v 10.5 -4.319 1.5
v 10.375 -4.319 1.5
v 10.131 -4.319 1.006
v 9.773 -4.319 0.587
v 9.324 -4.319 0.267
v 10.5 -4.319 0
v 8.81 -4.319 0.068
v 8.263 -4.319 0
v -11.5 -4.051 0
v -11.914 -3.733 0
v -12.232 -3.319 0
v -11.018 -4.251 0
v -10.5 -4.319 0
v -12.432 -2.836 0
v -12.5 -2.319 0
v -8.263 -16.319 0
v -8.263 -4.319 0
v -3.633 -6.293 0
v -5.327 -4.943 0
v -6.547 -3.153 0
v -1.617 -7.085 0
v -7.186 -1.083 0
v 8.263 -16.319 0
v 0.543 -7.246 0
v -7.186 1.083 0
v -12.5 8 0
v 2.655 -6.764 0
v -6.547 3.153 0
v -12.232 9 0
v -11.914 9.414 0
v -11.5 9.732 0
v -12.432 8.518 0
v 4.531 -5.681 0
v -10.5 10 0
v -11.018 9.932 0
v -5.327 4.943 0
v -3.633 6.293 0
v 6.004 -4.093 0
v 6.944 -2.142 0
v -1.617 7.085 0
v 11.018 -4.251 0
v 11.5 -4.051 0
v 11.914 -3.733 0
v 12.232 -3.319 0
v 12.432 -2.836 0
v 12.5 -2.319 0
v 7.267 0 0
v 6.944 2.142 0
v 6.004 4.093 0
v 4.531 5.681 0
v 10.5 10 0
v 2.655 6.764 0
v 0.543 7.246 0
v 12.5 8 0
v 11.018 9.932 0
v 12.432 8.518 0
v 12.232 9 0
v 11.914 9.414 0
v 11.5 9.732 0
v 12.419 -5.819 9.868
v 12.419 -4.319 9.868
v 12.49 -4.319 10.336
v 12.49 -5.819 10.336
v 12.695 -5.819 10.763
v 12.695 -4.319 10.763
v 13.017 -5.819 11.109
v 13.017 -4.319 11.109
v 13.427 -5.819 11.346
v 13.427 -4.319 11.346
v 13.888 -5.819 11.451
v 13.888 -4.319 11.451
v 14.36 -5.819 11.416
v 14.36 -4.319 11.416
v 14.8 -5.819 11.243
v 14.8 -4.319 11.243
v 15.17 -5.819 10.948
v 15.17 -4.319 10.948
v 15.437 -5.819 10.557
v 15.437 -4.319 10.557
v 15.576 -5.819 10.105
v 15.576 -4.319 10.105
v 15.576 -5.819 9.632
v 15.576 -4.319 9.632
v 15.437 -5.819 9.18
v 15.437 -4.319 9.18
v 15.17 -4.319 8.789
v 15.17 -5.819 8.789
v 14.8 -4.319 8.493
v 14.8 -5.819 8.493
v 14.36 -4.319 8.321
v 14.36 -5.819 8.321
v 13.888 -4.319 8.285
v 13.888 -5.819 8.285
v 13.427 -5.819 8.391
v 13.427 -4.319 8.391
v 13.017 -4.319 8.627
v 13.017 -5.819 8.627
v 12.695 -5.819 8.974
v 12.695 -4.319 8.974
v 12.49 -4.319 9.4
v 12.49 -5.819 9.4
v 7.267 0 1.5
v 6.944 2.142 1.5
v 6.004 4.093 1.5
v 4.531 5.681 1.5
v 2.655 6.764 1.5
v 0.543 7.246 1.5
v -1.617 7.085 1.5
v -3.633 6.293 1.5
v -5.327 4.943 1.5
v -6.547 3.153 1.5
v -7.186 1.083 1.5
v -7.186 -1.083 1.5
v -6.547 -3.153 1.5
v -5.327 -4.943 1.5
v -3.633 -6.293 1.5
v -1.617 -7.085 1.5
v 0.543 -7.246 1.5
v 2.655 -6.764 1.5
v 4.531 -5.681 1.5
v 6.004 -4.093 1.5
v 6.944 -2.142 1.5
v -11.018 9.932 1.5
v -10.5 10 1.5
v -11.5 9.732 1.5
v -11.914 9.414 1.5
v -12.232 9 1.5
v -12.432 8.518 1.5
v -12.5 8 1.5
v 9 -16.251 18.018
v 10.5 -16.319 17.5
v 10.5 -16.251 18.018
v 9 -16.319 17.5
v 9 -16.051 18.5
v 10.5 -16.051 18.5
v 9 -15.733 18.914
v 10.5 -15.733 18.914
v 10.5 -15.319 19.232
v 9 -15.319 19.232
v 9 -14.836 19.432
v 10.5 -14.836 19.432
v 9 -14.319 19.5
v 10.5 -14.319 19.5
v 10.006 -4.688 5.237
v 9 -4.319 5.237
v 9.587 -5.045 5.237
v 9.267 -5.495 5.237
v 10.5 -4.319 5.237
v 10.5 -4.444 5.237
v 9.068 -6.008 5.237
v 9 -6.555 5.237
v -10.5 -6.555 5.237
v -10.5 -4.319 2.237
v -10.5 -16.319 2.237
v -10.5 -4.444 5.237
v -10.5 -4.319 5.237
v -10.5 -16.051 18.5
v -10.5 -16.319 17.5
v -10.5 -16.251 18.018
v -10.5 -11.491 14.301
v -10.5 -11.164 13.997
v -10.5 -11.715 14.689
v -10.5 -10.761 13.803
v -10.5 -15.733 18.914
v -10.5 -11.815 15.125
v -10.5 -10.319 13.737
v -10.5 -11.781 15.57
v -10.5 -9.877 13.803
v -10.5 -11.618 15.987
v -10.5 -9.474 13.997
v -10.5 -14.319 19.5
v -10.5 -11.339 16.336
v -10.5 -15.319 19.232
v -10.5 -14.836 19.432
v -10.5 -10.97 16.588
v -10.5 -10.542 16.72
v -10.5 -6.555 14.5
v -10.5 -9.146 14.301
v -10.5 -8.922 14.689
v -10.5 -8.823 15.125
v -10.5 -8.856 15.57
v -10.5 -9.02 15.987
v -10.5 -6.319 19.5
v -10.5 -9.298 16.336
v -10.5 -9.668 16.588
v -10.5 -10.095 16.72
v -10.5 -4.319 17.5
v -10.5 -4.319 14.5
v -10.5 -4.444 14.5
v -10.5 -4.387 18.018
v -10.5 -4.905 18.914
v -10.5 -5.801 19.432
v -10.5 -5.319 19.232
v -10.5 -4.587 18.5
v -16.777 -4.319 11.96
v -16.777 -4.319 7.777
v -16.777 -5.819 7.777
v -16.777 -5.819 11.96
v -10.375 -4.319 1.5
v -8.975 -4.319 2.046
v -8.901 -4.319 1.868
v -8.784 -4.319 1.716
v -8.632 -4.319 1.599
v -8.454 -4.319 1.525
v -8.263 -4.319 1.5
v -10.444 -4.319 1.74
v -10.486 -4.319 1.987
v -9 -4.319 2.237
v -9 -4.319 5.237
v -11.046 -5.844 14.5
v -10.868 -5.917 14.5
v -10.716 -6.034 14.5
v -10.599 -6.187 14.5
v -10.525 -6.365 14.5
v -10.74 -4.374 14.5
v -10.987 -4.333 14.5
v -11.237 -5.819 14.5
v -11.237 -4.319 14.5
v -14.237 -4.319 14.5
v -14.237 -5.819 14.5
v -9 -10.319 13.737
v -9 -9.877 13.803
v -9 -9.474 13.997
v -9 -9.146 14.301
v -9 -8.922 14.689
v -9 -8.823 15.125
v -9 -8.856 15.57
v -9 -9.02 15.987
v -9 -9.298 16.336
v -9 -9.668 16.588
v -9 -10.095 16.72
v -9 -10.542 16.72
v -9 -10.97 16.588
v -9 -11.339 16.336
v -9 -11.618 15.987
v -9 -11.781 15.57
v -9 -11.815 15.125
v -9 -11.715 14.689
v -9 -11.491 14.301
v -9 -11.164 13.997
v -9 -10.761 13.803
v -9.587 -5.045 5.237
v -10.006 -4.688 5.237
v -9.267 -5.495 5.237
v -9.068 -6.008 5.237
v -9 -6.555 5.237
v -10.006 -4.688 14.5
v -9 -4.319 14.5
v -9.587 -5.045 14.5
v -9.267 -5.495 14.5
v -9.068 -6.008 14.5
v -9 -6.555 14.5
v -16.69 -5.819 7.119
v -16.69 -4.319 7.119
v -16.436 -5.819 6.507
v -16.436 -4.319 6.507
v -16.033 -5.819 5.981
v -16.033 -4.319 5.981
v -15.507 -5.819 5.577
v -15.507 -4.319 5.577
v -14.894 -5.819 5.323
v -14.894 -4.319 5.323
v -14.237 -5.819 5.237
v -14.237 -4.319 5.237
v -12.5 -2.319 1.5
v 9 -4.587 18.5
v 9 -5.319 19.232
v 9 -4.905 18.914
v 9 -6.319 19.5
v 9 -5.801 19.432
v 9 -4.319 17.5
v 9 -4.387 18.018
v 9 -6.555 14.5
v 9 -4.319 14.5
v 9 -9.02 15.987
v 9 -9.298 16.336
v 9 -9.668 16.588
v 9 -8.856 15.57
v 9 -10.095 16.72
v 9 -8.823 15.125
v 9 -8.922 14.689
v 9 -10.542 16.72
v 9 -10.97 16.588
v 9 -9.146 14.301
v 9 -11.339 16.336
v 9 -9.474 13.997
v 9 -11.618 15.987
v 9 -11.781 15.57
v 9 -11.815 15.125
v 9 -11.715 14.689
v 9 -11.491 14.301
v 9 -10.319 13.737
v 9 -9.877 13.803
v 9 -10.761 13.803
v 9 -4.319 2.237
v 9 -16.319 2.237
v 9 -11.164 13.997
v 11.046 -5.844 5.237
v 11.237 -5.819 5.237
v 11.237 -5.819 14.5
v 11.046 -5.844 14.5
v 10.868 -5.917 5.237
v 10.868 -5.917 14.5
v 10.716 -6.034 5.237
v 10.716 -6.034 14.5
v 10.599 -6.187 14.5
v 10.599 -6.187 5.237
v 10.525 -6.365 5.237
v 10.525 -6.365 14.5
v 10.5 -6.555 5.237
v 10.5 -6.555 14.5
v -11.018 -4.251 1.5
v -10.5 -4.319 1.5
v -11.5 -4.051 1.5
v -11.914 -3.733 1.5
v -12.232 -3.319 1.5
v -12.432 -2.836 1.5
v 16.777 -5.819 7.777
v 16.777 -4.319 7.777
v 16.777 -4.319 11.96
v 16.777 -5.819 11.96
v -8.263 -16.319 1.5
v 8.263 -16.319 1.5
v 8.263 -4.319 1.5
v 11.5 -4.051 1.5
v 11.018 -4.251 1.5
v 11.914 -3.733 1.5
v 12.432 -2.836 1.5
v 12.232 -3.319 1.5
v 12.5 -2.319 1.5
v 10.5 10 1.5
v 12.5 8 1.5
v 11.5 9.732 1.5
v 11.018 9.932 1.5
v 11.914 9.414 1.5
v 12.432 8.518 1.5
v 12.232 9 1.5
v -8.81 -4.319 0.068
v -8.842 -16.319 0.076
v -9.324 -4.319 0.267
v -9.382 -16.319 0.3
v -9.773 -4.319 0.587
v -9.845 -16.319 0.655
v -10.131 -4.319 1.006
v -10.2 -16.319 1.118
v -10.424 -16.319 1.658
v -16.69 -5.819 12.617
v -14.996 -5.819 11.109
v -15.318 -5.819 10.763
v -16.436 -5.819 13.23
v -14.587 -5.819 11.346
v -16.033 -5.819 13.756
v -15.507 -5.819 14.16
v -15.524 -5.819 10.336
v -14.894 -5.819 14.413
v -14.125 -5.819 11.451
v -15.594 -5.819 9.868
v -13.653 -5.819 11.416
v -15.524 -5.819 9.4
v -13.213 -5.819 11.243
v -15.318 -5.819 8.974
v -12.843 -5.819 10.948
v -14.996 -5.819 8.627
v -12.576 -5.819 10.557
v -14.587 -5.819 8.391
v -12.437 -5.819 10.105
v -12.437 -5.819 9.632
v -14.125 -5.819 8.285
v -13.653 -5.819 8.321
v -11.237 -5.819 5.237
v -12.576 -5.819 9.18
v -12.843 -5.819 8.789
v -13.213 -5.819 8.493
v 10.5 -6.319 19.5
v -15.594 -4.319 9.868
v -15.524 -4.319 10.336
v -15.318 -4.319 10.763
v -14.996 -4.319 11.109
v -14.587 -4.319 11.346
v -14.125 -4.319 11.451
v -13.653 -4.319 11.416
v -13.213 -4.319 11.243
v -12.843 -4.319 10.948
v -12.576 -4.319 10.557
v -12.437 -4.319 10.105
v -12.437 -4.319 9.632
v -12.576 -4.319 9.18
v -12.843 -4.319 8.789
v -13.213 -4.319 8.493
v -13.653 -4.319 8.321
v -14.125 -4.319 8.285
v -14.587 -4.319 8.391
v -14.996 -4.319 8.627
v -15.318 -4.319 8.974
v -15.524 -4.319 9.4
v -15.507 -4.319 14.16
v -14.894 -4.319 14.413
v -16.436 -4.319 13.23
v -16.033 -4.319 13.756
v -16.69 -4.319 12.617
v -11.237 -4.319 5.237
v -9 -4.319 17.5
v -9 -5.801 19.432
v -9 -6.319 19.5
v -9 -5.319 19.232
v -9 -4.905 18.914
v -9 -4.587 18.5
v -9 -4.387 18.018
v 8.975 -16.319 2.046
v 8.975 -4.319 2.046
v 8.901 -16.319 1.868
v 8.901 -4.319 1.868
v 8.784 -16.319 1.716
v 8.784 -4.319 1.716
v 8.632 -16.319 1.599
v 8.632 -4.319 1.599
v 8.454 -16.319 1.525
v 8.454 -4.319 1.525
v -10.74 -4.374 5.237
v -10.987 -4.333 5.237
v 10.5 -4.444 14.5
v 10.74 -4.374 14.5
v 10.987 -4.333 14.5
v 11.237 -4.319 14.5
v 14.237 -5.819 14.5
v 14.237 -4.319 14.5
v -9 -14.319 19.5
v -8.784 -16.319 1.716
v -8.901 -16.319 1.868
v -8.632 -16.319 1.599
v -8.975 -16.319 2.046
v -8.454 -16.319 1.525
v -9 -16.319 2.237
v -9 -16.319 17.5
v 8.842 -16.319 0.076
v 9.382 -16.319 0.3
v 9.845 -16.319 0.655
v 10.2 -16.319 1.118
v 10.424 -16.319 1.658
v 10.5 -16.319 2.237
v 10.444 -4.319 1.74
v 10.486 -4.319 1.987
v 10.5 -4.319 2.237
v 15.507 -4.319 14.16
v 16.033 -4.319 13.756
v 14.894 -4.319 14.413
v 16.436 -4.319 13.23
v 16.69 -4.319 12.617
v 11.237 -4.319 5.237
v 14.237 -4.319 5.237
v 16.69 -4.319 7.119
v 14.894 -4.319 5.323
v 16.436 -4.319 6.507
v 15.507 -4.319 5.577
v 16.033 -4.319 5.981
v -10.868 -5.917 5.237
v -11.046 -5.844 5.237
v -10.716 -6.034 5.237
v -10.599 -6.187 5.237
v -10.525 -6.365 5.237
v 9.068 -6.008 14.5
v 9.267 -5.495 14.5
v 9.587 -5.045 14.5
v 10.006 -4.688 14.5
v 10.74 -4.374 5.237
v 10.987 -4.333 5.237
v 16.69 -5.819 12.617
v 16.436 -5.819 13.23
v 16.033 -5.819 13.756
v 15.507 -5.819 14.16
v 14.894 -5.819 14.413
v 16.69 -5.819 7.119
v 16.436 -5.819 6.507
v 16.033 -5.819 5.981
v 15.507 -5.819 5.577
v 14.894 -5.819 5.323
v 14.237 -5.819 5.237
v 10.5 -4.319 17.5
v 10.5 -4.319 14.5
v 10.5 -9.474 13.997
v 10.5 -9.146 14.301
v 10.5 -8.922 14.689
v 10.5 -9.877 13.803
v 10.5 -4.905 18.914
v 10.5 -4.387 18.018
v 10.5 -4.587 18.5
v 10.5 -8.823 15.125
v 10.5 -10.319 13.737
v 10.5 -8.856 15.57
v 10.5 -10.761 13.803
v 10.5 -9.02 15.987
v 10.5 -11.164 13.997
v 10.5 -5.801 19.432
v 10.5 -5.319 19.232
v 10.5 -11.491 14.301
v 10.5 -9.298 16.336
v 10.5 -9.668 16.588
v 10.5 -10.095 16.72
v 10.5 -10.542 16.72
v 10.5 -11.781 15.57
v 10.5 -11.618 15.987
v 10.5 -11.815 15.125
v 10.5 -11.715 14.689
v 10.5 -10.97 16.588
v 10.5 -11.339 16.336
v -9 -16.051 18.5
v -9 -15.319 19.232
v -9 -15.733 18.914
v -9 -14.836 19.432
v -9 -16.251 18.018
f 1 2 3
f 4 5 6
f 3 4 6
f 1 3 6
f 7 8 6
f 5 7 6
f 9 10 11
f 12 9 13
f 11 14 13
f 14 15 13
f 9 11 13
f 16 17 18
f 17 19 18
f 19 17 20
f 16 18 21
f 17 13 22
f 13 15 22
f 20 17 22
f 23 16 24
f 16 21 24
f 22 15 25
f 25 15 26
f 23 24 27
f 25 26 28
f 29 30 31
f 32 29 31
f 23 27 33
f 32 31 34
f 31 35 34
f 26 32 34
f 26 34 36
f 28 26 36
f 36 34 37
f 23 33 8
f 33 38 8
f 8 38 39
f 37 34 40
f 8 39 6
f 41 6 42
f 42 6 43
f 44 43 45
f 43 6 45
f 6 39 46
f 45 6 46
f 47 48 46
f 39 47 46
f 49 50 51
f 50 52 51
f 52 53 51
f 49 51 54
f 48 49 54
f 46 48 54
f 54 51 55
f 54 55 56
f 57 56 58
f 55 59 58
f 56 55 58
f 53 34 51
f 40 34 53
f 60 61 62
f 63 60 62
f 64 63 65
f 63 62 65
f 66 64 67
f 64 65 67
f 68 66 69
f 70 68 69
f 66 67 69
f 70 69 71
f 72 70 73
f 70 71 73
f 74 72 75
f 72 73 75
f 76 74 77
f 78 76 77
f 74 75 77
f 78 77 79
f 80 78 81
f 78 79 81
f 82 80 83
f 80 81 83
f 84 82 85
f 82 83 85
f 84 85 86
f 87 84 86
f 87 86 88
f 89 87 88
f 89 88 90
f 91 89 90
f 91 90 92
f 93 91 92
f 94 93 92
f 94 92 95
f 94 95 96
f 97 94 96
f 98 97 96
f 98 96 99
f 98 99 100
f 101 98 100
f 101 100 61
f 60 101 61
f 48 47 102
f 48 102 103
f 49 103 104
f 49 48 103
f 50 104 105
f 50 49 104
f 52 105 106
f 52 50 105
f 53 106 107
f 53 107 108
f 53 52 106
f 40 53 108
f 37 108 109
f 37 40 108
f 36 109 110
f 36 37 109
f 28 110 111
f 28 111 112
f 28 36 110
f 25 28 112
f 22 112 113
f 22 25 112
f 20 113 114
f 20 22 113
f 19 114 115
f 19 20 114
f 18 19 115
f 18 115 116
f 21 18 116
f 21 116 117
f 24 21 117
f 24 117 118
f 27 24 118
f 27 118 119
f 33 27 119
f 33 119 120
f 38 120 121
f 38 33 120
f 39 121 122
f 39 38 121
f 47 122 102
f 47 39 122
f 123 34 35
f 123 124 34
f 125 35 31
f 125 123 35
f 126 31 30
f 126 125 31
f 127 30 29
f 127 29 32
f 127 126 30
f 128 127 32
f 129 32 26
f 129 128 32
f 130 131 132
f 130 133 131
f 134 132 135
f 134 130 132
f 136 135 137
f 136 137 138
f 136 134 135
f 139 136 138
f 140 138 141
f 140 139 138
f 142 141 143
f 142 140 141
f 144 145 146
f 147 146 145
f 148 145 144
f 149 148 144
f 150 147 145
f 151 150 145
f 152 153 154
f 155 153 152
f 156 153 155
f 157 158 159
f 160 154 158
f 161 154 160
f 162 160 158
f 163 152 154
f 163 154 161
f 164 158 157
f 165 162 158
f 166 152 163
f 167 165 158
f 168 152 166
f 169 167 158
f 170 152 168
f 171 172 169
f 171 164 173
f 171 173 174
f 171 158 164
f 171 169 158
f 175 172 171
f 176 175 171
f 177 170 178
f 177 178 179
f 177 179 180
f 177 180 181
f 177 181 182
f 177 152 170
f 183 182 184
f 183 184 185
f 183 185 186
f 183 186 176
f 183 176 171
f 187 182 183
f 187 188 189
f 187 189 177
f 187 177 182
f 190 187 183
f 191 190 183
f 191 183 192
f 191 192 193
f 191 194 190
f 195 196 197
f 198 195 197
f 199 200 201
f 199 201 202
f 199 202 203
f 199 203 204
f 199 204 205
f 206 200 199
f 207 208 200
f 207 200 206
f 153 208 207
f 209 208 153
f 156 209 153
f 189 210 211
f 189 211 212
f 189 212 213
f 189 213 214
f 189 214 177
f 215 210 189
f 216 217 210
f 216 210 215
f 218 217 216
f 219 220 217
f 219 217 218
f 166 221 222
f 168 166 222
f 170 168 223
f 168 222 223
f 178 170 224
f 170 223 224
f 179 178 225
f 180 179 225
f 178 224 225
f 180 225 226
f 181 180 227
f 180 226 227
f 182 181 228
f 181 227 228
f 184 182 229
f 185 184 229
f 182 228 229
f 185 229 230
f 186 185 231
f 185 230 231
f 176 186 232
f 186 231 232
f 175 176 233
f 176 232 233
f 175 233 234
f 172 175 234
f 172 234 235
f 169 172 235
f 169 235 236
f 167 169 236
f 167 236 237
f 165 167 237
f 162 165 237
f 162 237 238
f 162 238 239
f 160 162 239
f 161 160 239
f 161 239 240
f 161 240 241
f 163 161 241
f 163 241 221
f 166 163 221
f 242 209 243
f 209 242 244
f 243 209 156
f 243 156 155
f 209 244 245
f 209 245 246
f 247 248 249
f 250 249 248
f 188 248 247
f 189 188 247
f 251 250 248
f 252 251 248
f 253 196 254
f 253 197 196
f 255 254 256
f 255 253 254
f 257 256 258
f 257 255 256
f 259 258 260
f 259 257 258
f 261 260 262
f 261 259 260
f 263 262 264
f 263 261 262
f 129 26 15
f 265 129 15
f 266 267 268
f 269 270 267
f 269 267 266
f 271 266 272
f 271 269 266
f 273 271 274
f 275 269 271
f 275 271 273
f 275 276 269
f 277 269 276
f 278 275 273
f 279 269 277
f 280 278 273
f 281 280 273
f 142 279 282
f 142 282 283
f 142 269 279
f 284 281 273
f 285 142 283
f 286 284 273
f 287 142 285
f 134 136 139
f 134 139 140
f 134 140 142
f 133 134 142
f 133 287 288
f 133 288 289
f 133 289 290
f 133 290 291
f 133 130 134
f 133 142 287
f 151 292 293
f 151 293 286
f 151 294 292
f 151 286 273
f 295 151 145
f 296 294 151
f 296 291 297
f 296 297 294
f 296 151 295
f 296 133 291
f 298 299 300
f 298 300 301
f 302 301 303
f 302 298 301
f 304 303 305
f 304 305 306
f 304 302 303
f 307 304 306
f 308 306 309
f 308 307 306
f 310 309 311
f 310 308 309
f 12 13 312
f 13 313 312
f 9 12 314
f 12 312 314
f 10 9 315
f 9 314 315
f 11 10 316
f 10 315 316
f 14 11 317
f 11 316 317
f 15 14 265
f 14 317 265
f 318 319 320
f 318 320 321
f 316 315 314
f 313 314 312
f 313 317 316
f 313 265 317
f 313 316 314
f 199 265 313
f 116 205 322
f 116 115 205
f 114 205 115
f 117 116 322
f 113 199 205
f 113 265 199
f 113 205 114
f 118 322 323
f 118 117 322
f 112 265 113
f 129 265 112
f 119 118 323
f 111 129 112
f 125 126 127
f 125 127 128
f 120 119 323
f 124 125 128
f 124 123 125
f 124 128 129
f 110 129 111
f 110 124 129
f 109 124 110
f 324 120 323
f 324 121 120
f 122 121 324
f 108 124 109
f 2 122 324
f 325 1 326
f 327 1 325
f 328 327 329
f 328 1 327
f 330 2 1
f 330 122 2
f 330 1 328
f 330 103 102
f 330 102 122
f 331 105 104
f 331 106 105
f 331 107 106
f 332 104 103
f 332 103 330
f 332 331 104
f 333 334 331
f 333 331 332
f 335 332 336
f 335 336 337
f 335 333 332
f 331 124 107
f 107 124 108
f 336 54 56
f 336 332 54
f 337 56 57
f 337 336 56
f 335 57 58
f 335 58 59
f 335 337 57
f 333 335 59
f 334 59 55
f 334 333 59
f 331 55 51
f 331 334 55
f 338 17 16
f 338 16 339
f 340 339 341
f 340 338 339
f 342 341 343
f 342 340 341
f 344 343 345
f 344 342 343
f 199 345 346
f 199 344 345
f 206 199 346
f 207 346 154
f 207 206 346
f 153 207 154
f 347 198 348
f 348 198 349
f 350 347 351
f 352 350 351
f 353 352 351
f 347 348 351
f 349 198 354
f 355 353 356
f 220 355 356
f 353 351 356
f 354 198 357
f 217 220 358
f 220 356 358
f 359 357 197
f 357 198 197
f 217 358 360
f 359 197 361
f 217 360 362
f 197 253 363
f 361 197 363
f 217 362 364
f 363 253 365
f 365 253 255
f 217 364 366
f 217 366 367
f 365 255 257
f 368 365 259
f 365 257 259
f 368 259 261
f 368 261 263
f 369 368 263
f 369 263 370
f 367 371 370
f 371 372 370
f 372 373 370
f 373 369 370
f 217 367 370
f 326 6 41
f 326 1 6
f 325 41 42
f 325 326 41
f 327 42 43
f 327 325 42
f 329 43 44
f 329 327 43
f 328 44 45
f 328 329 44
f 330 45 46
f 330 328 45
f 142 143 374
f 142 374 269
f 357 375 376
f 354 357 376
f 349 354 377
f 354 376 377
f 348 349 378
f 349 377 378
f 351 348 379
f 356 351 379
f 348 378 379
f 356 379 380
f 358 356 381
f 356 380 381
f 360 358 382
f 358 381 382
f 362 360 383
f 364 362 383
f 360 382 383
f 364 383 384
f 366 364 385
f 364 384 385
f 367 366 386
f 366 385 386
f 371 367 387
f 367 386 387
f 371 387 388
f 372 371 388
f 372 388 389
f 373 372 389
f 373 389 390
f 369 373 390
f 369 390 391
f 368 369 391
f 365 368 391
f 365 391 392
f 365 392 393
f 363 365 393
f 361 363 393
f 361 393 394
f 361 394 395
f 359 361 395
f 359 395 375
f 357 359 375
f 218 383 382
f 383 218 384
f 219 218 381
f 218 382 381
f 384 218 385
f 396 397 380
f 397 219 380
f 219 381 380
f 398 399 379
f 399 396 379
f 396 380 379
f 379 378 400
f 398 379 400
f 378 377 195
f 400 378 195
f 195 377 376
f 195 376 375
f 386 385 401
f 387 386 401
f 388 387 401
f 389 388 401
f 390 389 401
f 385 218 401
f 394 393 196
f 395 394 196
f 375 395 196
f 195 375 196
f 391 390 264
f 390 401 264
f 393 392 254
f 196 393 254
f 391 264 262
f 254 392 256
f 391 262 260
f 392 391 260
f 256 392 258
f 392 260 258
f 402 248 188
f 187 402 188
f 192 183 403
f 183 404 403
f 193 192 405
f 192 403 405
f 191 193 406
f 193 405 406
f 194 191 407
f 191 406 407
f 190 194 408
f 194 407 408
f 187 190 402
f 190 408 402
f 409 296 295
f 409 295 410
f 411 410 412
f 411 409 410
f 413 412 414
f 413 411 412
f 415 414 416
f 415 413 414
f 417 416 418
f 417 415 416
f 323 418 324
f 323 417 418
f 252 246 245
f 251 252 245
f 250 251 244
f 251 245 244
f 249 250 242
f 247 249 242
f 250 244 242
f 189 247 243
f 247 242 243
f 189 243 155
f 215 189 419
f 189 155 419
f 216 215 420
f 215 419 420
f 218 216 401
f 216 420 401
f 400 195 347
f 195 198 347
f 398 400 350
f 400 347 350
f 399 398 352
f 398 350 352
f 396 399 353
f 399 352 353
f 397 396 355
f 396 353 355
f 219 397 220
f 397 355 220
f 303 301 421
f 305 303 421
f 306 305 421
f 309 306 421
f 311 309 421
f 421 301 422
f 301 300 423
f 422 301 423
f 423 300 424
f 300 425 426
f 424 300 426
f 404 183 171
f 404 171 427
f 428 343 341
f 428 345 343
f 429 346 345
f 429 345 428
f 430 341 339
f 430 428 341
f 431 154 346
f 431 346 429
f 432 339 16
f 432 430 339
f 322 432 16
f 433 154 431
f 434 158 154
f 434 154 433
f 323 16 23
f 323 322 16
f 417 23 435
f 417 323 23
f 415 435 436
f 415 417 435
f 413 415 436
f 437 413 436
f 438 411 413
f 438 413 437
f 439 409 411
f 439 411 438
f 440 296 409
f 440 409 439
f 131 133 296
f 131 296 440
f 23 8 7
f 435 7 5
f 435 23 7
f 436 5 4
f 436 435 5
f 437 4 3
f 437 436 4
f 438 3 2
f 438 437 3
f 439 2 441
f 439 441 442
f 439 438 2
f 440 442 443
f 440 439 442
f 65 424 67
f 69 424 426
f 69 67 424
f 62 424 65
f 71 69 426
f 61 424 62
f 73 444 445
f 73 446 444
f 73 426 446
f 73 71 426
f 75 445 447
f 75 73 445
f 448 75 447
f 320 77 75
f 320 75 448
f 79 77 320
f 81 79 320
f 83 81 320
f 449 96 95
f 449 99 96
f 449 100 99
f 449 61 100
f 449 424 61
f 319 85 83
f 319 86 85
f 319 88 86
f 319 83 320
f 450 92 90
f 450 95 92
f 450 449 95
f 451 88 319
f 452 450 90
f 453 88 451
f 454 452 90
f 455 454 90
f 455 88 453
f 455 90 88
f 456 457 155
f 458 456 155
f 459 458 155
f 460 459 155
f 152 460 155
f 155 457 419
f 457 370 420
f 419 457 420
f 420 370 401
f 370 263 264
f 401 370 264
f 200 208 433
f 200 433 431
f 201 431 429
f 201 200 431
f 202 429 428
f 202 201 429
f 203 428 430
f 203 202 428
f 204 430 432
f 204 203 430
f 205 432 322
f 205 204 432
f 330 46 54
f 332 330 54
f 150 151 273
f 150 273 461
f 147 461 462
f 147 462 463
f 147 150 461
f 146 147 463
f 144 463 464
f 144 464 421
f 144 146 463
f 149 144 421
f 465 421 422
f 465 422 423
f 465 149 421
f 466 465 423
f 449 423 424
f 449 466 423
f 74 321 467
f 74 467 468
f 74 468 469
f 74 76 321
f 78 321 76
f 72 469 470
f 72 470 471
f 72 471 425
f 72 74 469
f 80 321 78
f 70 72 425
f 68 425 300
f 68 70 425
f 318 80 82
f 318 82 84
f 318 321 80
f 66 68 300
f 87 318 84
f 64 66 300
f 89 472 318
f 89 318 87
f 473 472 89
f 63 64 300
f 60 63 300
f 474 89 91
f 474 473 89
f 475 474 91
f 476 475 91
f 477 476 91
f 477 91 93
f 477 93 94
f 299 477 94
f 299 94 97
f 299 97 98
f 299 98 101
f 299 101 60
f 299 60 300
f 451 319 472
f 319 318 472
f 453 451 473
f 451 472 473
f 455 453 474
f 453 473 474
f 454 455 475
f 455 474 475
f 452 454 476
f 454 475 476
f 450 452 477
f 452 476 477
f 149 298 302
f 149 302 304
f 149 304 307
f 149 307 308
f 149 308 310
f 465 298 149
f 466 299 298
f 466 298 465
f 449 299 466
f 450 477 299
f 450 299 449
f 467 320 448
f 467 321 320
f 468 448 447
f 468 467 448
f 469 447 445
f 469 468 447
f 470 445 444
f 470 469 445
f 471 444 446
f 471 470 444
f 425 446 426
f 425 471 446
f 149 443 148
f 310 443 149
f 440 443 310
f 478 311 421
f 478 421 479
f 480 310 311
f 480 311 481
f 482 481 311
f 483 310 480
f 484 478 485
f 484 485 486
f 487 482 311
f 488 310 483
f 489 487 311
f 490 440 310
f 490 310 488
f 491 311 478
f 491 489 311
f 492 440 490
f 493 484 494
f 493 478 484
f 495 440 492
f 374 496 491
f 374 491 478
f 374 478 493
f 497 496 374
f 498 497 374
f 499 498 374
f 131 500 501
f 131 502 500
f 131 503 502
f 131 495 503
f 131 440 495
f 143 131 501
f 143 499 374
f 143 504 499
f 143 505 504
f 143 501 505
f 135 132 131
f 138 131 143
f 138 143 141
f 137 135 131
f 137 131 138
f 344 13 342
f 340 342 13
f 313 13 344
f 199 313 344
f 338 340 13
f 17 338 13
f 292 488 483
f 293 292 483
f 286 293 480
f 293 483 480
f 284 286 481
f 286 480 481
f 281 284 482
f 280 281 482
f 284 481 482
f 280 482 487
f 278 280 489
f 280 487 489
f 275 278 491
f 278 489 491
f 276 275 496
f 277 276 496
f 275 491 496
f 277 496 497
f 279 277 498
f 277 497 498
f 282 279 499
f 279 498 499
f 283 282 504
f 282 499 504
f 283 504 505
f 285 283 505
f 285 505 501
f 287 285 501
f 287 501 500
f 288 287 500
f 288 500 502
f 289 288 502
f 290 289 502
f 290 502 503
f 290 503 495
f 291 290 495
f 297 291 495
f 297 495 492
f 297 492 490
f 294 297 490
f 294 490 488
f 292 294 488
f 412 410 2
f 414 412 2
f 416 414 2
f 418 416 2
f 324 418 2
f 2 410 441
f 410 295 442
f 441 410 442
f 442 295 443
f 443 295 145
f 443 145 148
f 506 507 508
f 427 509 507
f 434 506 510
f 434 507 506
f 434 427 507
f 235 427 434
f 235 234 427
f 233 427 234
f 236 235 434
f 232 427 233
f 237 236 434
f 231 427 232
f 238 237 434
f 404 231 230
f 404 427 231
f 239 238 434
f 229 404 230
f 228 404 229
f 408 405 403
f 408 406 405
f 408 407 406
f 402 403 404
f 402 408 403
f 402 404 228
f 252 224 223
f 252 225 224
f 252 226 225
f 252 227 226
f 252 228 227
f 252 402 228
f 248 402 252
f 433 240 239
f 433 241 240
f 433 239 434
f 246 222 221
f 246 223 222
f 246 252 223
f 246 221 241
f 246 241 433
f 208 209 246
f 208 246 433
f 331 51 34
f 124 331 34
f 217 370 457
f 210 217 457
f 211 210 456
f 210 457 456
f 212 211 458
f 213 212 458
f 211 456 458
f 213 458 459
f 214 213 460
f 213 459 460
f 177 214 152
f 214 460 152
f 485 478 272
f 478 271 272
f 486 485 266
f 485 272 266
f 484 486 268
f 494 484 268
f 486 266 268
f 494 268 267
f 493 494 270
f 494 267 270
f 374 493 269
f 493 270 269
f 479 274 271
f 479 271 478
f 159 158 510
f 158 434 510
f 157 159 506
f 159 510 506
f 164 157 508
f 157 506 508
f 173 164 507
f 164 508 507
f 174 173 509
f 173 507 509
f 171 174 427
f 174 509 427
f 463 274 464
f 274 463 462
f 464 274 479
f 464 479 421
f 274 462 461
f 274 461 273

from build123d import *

# Parameters (mm, degrees)
SKETCH1_R                      = 7.266716582
BASE_FLANGE1_DEPTH             = 1.5
EDGE_FLANGE1_STRIP_W           = 7.4732
EDGE_FLANGE1_STRIP_H           = 1.5
EDGE_FLANGE1_STRIP_CUT_DEPTH   = 12
EDGE_FLANGE1_STRIP_2_W         = 7.4732
EDGE_FLANGE1_STRIP_2_H         = 1.5
EDGE_FLANGE1_STRIP_CUT_2_DEPTH = 12
EDGE_FLANGE1_DEPTH             = 12
EDGE_FLANGE1_BEND_DEPTH        = 12
SKETCH9_R                      = 1.5
CUT_EXTRUDE1_DEPTH             = 35.286317994
FILLET1_R                      = 2
EDGE_FLANGE3_STRIP_W           = 7.4732
EDGE_FLANGE3_STRIP_H           = 1.5
EDGE_FLANGE3_STRIP_CUT_DEPTH   = 9.2634
EDGE_FLANGE3_DEPTH             = 9.2634
FILLET2_R                      = 2.54
FILLET2_OF_MIRROR1_R           = 2.54
SKETCH20_R                     = 1.5875
CUT_EXTRUDE3_DEPTH             = 2.54


# Sheet-metal steps are written as plain solids
with BuildPart() as part:
    # Sketch1 → Base-Flange1 (new body)
    with BuildSketch(Plane.XY):
        Polygon((-9, -16.31875), (9, -16.31875), (9, -4.31875), (12.5, -4.31875), (12.5, 10), (-12.5, 10), (-12.5, -4.31875), (-9, -4.31875), align=None)
        Circle(SKETCH1_R, mode=Mode.SUBTRACT)
    extrude(amount=BASE_FLANGE1_DEPTH)

    # Edge-Flange1 strip (across the edge) → Edge-Flange1 strip cut (cut)
    with BuildSketch(Plane(origin=(-9, -4.31875, 1.5), x_dir=(1, 0, 0), z_dir=(0, -1, 0))):
        with Locations((-3, -0.75)):
            Rectangle(EDGE_FLANGE1_STRIP_W, EDGE_FLANGE1_STRIP_H)
    extrude(amount=EDGE_FLANGE1_STRIP_CUT_DEPTH, mode=Mode.SUBTRACT)

    # Edge-Flange1 strip 2 (across the edge) → Edge-Flange1 strip cut 2 (cut)
    with BuildSketch(Plane(origin=(9, -16.31875, 1.5), x_dir=(-1, 0, 0), z_dir=(0, 1, 0))):
        with Locations((-3, -0.75)):
            Rectangle(EDGE_FLANGE1_STRIP_2_W, EDGE_FLANGE1_STRIP_2_H)
    extrude(amount=EDGE_FLANGE1_STRIP_CUT_2_DEPTH, mode=Mode.SUBTRACT)

    # Edge-Flange1 section (across the edge) → Edge-Flange1 (add)
    with BuildSketch(Plane(origin=(-9, -4.31875, 1.5), x_dir=(1, 0, 0), z_dir=(0, -1, 0))):
        with BuildLine():
            Line((-1.5, 0.7366), (-1.5, 18))
            Line((-1.5, 18), (0, 18))
            Line((0, 18), (0, 0.7366))
            ThreePointArc((0, 0.7366), (0.215745145, 0.215745145), (0.7366, 0))
            Line((0.7366, 0), (0.7366, -1.5))
            ThreePointArc((0.7366, -1.5), (-0.844915027, -0.844915027), (-1.5, 0.7366))
        make_face()
    extrude(amount=EDGE_FLANGE1_DEPTH)

    # Edge-Flange1 section 2 (across the edge) → Edge-Flange1 bend (add)
    with BuildSketch(Plane(origin=(9, -16.31875, 1.5), x_dir=(-1, 0, 0), z_dir=(0, 1, 0))):
        with BuildLine():
            Line((-1.5, 0.7366), (-1.5, 18))
            Line((-1.5, 18), (0, 18))
            Line((0, 18), (0, 0.7366))
            ThreePointArc((0, 0.7366), (0.215745145, 0.215745145), (0.7366, 0))
            Line((0.7366, 0), (0.7366, -1.5))
            ThreePointArc((0.7366, -1.5), (-0.844915027, -0.844915027), (-1.5, 0.7366))
        make_face()
    extrude(amount=EDGE_FLANGE1_BEND_DEPTH)

    # Sketch9 → Cut-Extrude1 (cut, through all)
    with BuildSketch(Plane(origin=(10.5, 0, 0), x_dir=(0, 0, -1), z_dir=(1, 0, 0))):
        with Locations((-15.2366, -10.31875)):
            Circle(SKETCH9_R)
    extrude(amount=-CUT_EXTRUDE1_DEPTH, mode=Mode.SUBTRACT)

    # Fillet1
    fillet1_edges = [part.edges().sort_by_distance(p)[0] for p in [
        (-12.5, -4.31875, 0.75),
        (-12.5, 10, 0.75),
        (12.5, 10, 0.75),
        (12.5, -4.31875, 0.75),
        (-9.75, -4.31875, 19.5),
        (-9.75, -16.31875, 19.5),
        (9.75, -16.31875, 19.5),
        (9.75, -4.31875, 19.5),
    ]]
    fillet(fillet1_edges, radius=FILLET1_R)

    # Edge-Flange3 strip (across the edge) → Edge-Flange3 strip cut (cut)
    with BuildSketch(Plane(origin=(10.5, -4.31875, 5.2366), x_dir=(0, -1, 0), z_dir=(0, 0, 1))):
        with Locations((-1.5, -0.75)):
            Rectangle(EDGE_FLANGE3_STRIP_W, EDGE_FLANGE3_STRIP_H)
    edge_flange3_strip_cut = extrude(amount=EDGE_FLANGE3_STRIP_CUT_DEPTH, mode=Mode.SUBTRACT)

    # Edge-Flange3 section (across the edge) → Edge-Flange3 (add)
    with BuildSketch(Plane(origin=(10.5, -4.31875, 5.2366), x_dir=(0, -1, 0), z_dir=(0, 0, 1))):
        with BuildLine():
            Line((0, 0.7366), (0, 6.2766))
            Line((0, 6.2766), (1.5, 6.2766))
            Line((1.5, 6.2766), (1.5, 0.7366))
            ThreePointArc((1.5, 0.7366), (1.715745145, 0.215745145), (2.2366, 0))
            Line((2.2366, 0), (2.2366, -1.5))
            ThreePointArc((2.2366, -1.5), (0.655084973, -0.844915027), (0, 0.7366))
        make_face()
    edge_flange3 = extrude(amount=EDGE_FLANGE3_DEPTH)

    # Fillet2
    fillet2_edges = [part.edges().sort_by_distance(p)[0] for p in [
        (16.7766, -5.06875, 5.2366),
        (16.7766, -5.06875, 14.5),
    ]]
    fillet(fillet2_edges, radius=FILLET2_R)

    # Mirror1: Edge-Flange3 strip cut, Edge-Flange3 across plane
    add(edge_flange3_strip_cut.mirror(Plane(origin=(0, 0, 0), x_dir=(0, 0, 1), z_dir=(1, 0, 0))), mode=Mode.SUBTRACT)
    add(edge_flange3.mirror(Plane(origin=(0, 0, 0), x_dir=(0, 0, 1), z_dir=(1, 0, 0))))

    # Fillet2 of Mirror1
    fillet2_of_mirror1_edges = [part.edges().sort_by_distance(p)[0] for p in [
        (-16.7766, -5.06875, 5.2366),
        (-16.7766, -5.06875, 14.5),
    ]]
    fillet(fillet2_of_mirror1_edges, radius=FILLET2_OF_MIRROR1_R)

    # Sketch20 → Cut-Extrude3 (cut)
    with BuildSketch(Plane(origin=(0, -4.31875, 0), x_dir=(1, 0, 0), z_dir=(0, 1, 0))):
        with Locations(Location((14.0066, -9.8683, 0), (0, 0, 180))):
            Circle(SKETCH20_R)
        with Locations(Location((-14.0066, -9.8683, 0), (0, 0, 180))):
            Circle(SKETCH20_R)
    extrude(amount=-CUT_EXTRUDE3_DEPTH, mode=Mode.SUBTRACT)


solid = part.part
